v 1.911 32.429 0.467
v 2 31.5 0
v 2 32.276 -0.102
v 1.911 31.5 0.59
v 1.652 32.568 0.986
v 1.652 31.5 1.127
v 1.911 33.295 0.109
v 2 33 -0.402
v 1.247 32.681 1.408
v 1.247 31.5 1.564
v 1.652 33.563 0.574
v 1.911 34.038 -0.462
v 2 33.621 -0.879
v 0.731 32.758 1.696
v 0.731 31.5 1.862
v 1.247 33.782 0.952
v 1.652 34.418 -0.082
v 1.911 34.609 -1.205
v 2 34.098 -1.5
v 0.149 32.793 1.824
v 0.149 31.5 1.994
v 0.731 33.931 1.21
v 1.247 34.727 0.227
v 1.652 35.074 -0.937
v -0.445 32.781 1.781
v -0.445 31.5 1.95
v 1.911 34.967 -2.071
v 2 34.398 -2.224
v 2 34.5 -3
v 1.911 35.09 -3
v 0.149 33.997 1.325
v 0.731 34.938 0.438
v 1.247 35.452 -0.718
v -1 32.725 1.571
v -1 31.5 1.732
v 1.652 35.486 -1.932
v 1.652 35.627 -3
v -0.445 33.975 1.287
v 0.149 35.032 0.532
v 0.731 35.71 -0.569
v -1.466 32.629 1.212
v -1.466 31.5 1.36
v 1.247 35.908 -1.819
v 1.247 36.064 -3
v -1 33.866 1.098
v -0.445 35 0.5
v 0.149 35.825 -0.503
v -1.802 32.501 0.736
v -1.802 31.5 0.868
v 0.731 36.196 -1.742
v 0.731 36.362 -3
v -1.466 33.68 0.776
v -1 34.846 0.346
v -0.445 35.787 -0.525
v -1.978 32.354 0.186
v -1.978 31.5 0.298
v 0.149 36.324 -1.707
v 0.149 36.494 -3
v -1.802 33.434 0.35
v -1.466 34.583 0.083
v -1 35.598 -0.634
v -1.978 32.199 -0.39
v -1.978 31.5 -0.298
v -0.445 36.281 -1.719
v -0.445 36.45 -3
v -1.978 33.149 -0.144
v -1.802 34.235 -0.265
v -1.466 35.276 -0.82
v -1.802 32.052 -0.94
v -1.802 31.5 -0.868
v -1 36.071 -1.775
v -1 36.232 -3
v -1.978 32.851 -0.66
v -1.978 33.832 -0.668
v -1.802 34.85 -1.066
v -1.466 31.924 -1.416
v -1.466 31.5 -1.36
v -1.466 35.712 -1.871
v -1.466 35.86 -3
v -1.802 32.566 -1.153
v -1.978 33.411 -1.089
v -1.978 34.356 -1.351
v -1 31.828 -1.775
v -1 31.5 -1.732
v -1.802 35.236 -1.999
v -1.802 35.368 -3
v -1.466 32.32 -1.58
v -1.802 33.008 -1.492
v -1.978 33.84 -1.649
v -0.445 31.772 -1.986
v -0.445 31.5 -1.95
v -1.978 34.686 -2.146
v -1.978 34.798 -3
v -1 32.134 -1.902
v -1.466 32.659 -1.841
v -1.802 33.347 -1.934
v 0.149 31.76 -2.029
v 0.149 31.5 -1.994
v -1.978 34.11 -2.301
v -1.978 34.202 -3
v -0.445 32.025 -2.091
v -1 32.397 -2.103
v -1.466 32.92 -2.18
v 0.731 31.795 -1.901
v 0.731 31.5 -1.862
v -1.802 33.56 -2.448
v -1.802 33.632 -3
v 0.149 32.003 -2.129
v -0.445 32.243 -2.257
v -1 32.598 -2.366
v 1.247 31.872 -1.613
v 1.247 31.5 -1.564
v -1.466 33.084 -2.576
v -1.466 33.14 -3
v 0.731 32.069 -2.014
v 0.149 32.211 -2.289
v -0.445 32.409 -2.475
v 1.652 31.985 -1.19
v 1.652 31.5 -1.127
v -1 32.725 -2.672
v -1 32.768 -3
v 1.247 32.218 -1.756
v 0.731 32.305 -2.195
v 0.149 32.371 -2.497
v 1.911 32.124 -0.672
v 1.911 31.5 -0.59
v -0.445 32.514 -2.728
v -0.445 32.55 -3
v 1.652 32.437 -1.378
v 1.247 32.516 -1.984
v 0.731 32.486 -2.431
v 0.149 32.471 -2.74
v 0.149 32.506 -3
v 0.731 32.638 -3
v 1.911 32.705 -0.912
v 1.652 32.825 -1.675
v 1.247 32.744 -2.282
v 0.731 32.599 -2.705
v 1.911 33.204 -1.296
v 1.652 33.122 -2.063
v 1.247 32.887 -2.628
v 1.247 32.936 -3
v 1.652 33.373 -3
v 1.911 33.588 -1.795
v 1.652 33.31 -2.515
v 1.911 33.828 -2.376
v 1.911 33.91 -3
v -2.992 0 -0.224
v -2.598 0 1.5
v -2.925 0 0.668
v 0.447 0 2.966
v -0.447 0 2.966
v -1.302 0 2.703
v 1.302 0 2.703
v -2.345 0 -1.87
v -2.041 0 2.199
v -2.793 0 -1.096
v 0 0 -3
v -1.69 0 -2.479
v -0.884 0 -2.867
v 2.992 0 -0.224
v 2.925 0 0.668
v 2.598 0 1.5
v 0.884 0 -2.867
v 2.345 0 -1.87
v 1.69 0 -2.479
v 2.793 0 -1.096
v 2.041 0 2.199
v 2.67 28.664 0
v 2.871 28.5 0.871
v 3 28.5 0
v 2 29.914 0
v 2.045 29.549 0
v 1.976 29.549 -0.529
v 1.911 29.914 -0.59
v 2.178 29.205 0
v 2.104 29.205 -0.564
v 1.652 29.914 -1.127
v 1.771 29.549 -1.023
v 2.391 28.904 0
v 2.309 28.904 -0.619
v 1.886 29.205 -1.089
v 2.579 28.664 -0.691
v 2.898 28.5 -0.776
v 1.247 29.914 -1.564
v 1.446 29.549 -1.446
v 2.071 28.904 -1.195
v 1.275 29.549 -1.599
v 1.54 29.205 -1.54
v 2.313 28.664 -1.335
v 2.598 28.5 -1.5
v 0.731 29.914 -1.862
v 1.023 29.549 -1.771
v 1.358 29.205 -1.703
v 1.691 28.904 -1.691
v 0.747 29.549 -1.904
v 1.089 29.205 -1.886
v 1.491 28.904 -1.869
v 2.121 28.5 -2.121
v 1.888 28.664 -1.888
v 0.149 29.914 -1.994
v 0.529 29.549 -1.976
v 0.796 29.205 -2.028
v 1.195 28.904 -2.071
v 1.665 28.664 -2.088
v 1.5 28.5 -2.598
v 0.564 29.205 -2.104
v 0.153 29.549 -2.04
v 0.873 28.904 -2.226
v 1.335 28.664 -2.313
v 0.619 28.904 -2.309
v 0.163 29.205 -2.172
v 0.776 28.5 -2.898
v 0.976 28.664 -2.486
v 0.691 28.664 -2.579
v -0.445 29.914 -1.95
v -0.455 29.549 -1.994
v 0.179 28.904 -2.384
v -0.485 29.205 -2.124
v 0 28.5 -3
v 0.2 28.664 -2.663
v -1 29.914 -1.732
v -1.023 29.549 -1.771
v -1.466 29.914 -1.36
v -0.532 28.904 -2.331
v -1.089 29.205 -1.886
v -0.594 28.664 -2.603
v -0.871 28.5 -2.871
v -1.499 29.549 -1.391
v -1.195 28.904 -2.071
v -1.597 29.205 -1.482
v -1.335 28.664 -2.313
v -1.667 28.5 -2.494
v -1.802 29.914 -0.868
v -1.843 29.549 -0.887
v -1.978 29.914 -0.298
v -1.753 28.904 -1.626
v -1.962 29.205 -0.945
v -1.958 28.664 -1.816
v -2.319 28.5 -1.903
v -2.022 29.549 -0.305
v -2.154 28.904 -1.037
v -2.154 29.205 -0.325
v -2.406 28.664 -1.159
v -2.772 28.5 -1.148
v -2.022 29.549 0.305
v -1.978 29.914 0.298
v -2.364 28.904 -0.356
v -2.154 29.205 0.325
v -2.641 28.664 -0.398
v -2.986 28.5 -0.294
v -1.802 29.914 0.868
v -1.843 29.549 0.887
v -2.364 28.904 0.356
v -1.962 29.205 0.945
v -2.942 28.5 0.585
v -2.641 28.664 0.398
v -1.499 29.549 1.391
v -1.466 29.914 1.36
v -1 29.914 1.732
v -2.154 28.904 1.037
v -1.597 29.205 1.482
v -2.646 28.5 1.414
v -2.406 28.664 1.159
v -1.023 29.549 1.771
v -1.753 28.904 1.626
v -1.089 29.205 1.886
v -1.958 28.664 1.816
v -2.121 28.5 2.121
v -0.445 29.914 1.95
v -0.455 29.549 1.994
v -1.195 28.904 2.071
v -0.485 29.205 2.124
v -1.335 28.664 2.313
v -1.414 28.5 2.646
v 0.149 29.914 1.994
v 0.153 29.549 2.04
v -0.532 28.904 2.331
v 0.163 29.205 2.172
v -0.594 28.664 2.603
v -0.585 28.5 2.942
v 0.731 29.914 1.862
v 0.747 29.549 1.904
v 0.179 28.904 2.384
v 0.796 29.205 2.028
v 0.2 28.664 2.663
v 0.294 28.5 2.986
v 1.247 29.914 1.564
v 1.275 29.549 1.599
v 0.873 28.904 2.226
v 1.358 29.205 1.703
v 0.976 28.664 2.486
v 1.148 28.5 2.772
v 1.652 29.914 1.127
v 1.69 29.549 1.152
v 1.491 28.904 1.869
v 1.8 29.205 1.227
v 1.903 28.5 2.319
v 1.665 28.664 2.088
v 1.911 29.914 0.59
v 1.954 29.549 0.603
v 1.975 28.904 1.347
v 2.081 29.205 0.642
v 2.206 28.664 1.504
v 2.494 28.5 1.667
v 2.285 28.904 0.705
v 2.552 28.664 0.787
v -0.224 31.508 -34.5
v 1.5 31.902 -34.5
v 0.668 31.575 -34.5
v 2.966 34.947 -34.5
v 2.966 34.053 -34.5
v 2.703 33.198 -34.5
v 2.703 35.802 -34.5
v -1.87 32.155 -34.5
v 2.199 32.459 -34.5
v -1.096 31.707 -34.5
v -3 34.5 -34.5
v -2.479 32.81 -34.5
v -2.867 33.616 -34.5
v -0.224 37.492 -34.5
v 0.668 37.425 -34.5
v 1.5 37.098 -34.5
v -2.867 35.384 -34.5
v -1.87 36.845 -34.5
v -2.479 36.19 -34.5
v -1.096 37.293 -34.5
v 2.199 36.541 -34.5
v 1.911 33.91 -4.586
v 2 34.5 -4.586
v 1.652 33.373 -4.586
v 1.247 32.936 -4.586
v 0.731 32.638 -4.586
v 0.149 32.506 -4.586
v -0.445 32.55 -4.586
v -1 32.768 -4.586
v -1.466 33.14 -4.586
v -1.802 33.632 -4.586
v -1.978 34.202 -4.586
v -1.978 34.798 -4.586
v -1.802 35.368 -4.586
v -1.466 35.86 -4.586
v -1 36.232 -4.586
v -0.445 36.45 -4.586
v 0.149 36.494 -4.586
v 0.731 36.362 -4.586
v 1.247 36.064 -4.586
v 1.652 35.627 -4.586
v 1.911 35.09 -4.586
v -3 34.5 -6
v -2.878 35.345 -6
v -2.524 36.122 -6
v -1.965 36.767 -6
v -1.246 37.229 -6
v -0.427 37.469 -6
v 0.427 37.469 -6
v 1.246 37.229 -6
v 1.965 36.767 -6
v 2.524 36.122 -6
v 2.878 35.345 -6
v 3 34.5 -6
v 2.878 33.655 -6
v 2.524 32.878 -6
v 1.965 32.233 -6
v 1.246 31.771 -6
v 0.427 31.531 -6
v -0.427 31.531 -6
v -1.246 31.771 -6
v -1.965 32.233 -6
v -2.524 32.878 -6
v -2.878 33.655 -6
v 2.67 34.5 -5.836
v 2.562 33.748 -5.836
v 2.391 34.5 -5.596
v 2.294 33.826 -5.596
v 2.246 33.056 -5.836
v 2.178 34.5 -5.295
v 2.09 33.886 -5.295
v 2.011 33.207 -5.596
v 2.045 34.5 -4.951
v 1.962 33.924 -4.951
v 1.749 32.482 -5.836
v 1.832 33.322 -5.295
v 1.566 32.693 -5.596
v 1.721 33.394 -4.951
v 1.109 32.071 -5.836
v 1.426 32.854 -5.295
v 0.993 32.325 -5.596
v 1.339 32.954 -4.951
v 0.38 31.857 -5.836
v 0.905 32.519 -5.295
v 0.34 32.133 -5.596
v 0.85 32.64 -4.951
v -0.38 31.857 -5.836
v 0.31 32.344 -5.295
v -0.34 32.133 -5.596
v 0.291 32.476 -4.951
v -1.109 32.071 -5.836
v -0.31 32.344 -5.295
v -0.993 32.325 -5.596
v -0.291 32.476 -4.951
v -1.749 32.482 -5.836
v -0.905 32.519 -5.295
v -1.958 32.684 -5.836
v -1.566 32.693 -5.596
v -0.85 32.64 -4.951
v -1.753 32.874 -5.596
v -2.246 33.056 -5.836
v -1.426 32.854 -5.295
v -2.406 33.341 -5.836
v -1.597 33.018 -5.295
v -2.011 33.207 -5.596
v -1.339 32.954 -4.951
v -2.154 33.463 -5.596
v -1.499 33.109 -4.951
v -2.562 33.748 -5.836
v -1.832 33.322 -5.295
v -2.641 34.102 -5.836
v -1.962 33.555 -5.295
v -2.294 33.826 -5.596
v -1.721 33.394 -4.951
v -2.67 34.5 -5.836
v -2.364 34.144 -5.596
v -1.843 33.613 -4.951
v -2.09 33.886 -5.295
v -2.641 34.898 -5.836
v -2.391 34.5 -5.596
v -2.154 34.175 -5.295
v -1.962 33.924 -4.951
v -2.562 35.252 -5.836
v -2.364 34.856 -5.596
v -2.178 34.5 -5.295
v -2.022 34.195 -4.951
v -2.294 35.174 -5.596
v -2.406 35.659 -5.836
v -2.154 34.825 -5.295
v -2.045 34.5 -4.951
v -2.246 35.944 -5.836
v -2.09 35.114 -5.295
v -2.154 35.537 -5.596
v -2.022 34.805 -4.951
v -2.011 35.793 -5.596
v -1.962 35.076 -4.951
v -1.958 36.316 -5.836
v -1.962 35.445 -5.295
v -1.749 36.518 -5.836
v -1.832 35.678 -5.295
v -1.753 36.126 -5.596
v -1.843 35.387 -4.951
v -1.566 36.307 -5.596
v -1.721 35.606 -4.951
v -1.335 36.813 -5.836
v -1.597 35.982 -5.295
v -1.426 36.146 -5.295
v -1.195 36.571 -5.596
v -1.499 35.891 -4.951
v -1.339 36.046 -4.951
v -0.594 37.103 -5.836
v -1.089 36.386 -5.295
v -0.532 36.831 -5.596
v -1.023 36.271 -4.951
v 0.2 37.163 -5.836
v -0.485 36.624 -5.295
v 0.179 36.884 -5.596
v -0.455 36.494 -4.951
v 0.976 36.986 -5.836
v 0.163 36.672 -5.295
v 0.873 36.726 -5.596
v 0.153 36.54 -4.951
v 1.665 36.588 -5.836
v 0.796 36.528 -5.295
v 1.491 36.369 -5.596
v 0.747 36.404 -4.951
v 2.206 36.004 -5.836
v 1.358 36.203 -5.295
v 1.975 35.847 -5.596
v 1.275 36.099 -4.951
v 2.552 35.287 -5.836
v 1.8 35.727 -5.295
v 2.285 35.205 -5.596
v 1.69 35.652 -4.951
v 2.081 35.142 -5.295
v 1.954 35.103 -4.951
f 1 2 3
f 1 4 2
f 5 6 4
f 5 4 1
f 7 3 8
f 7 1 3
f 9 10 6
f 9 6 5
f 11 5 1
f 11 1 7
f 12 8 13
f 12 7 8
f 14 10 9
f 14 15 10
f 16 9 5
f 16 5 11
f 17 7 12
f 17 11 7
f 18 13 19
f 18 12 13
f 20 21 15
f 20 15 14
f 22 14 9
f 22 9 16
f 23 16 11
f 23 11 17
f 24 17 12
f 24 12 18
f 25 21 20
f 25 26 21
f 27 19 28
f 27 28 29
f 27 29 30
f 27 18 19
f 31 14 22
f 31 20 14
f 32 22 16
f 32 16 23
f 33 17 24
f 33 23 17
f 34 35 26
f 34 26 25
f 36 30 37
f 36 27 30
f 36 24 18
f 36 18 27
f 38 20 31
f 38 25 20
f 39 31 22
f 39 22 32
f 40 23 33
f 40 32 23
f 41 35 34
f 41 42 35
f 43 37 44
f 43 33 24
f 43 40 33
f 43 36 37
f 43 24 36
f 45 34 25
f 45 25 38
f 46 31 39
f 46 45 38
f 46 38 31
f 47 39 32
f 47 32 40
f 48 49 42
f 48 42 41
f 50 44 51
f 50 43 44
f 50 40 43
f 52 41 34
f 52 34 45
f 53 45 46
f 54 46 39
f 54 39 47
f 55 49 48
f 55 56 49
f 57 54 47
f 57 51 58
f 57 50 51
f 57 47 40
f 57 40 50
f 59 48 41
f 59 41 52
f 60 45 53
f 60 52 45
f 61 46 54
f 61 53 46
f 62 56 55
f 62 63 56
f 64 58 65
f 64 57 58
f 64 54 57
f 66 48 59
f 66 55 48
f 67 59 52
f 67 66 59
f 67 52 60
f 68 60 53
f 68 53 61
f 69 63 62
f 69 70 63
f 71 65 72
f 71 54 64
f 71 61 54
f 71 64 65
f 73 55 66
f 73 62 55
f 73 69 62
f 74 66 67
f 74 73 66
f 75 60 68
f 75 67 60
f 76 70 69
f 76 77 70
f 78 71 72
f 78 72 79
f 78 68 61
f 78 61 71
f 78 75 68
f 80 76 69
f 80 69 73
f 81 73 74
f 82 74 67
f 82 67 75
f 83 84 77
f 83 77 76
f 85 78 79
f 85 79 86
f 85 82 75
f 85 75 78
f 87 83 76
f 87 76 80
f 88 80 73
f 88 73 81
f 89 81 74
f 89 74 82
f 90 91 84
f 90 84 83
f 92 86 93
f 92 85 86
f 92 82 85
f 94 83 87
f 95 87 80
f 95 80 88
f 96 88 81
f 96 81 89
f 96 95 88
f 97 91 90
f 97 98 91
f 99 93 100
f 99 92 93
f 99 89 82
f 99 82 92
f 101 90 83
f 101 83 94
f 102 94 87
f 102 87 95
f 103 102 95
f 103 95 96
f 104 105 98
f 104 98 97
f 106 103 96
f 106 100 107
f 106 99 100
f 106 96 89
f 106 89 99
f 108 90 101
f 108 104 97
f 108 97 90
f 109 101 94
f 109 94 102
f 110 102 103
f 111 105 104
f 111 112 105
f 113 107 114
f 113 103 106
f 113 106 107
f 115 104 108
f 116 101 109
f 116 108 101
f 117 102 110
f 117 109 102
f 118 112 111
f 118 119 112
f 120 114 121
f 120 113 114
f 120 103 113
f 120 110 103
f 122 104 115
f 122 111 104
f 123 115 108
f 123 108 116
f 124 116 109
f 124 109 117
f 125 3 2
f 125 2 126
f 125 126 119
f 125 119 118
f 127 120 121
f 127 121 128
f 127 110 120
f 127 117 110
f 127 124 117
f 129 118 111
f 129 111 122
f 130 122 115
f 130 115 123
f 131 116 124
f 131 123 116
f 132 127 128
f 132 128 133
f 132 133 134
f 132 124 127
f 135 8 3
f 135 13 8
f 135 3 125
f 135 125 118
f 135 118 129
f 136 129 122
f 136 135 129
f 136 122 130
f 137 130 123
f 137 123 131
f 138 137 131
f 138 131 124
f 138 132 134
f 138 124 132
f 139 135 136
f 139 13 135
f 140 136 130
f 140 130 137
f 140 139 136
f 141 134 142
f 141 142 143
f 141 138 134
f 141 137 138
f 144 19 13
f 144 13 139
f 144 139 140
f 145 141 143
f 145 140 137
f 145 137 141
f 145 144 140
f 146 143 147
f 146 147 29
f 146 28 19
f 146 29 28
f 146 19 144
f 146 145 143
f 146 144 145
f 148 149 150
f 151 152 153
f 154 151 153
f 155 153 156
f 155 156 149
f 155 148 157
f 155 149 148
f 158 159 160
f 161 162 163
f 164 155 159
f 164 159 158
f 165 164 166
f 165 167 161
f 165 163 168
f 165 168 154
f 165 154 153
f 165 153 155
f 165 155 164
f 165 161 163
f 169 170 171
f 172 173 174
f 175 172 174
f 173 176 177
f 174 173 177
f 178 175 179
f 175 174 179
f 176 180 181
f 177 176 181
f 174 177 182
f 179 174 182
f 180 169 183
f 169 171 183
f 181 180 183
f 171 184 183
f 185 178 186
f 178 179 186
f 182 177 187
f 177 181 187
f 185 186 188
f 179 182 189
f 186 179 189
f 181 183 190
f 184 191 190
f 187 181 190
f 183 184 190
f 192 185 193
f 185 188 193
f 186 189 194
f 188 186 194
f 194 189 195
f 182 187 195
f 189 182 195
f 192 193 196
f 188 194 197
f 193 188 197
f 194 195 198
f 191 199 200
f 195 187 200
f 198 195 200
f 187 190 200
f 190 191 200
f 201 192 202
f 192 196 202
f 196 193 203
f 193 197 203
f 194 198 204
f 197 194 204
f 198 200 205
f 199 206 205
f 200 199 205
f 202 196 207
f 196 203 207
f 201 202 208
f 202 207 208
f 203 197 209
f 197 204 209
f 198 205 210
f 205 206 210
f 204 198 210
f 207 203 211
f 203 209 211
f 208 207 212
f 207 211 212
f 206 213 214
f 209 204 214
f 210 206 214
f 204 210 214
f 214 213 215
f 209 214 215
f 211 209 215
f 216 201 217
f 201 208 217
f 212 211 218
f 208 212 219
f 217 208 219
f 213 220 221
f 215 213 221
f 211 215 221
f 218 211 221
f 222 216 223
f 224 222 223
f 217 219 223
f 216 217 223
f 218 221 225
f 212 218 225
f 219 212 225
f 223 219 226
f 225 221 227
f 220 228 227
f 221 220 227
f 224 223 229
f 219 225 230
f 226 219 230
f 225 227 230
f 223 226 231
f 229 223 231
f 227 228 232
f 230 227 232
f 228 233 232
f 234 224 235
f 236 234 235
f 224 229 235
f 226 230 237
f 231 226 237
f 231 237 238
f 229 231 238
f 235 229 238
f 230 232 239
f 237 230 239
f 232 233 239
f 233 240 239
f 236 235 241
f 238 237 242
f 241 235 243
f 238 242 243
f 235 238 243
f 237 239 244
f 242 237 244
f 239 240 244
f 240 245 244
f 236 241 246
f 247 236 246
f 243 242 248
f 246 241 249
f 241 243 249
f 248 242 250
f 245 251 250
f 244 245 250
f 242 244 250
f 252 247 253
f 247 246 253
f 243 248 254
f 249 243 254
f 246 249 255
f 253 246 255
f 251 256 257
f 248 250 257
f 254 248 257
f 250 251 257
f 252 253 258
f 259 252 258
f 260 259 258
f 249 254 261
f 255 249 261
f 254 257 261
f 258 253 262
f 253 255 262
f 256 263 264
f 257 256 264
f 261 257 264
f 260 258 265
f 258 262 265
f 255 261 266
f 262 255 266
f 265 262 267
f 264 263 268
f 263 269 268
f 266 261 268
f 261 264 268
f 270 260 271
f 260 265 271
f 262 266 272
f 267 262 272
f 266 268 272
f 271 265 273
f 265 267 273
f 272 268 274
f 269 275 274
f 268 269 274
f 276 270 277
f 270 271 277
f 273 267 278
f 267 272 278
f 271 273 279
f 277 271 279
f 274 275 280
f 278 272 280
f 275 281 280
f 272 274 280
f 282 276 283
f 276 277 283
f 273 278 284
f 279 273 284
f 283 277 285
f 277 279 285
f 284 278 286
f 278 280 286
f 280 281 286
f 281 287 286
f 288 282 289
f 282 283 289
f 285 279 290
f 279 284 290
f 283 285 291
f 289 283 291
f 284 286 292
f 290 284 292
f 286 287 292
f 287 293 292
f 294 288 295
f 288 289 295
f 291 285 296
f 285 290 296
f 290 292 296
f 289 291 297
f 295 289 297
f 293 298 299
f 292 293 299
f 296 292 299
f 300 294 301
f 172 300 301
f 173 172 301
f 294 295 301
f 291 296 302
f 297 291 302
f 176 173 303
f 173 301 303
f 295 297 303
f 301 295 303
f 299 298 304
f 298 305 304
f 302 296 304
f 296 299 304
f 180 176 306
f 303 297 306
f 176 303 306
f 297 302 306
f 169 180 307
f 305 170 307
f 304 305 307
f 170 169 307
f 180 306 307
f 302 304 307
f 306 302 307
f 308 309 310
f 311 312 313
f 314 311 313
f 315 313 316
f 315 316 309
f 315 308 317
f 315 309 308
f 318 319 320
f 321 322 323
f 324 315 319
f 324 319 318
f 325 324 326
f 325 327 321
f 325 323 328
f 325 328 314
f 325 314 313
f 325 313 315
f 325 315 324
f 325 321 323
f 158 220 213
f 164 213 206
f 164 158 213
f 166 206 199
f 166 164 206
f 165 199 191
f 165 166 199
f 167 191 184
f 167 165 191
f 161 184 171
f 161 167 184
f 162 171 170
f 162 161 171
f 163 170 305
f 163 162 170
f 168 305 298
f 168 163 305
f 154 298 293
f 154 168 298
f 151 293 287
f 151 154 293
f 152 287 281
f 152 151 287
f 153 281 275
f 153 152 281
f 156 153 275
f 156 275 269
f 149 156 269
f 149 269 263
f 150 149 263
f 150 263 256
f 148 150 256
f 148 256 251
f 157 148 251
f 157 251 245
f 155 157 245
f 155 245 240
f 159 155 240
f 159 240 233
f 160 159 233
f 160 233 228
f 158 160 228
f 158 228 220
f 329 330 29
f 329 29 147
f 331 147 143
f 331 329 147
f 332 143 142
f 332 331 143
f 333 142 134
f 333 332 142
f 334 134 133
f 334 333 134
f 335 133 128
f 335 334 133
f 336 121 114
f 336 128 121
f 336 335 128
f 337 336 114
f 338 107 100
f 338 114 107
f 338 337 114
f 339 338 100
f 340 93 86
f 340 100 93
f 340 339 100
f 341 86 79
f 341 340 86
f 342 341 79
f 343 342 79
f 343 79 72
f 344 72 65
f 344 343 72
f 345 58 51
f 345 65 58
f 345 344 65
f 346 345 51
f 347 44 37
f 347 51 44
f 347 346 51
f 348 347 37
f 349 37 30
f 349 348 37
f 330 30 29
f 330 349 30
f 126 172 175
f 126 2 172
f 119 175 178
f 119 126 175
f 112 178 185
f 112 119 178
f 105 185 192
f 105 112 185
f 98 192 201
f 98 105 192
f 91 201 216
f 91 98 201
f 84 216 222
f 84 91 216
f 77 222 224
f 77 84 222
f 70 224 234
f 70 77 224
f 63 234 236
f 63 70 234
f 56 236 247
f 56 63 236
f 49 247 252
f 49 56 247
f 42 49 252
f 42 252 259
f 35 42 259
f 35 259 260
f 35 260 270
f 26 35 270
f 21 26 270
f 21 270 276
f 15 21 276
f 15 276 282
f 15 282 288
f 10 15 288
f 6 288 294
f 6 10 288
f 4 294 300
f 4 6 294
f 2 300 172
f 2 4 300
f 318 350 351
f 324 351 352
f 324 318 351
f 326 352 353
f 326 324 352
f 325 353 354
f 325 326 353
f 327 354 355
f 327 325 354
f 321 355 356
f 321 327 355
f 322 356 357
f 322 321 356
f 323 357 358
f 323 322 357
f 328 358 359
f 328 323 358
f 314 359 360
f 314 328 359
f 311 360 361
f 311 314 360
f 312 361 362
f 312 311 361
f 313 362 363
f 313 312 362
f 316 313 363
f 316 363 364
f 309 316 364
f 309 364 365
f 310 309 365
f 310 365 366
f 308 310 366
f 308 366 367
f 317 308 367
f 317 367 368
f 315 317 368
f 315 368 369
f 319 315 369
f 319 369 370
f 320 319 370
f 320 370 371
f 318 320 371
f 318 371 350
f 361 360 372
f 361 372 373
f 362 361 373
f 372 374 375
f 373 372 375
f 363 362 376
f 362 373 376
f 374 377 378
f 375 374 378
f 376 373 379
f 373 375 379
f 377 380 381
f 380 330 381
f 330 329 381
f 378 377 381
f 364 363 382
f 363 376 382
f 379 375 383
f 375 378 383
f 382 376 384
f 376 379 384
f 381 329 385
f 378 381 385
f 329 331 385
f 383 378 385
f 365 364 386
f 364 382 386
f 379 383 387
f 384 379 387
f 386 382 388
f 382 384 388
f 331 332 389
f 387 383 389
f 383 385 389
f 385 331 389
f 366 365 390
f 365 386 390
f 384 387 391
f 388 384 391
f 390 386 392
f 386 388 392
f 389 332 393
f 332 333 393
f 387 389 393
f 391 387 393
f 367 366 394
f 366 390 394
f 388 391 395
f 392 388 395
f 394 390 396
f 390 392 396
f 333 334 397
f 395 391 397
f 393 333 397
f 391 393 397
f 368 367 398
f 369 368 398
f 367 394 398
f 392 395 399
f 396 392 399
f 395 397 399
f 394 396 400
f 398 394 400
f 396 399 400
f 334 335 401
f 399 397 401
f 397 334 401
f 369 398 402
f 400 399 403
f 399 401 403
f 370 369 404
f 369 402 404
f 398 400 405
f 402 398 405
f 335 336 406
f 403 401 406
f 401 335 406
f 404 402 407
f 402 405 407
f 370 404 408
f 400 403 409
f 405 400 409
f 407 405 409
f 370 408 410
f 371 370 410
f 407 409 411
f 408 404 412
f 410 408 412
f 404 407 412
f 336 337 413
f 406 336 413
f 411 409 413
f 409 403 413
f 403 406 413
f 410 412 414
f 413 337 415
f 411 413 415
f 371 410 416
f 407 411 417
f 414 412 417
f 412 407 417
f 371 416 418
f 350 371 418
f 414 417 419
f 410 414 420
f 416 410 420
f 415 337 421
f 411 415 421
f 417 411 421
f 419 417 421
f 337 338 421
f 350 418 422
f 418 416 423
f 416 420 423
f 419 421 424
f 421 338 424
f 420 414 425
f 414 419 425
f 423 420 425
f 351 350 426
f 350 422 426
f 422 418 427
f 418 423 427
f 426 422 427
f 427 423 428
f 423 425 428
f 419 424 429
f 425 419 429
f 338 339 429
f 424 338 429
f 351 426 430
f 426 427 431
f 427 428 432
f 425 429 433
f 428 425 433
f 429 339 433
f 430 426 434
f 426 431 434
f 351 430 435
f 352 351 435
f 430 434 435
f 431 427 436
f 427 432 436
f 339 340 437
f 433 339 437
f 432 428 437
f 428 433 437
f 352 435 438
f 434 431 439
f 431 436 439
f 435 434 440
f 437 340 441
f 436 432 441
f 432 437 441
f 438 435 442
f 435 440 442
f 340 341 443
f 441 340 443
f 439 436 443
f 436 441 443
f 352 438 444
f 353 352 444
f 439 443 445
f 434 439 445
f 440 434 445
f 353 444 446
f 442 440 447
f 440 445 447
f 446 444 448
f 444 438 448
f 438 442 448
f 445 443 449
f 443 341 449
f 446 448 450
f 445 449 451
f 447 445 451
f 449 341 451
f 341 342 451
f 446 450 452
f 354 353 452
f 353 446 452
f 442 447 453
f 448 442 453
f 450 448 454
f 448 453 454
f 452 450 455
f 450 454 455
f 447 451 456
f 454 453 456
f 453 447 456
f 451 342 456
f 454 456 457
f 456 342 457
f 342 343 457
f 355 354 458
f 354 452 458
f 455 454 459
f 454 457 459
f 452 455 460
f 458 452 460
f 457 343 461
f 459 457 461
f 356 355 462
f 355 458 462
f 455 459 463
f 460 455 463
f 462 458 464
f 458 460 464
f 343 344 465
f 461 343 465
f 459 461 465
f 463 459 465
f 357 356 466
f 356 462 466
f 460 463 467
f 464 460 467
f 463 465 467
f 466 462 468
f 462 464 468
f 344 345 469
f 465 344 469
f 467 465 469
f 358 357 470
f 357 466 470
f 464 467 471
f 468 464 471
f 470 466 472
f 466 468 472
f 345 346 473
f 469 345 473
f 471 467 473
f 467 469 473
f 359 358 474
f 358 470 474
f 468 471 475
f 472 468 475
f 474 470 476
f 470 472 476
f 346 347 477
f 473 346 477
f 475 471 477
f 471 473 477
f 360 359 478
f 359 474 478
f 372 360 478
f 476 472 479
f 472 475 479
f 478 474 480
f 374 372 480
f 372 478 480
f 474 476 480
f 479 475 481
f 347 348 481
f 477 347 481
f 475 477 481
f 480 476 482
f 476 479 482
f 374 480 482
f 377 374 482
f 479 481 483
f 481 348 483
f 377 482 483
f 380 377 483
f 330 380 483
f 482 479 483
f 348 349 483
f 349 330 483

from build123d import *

# Parameters (mm, degrees)
SKETCH_1_R      = 2
SKETCH_3_R      = 3
EXTRUDE_1_DEPTH = 28.5
SKETCH_4_R      = 3
EXTRUDE_2_DEPTH = 28.5
FILLET_1_R      = 1.5


with BuildPart() as part:
    # 스윕1: sweep along a path in 스케치2
    with BuildLine(Plane(origin=(0, 0, 0), x_dir=(0, 0, -1), z_dir=(1, 0, 0))) as sweep_1_path:
        Line((0, 0), (0, 31.5))
        ThreePointArc((0, 31.5), (0.878679656, 33.621320344), (3, 34.5))
        Line((3, 34.5), (34.5, 34.5))
    # 스케치1 → 스윕1 (sweep)
    with BuildSketch(Plane(origin=(0, 0, 0), x_dir=(1, 0, 0), z_dir=(0, 1, 0))):
        Circle(SKETCH_1_R)
    sweep(path=sweep_1_path.line)

    # 스케치3 → 보스-돌출1 (add)
    with BuildSketch(Plane.XZ):
        with Locations(Location((0, 0, 0), (0, 0, 270))):
            Circle(SKETCH_3_R)
    extrude(amount=-EXTRUDE_1_DEPTH)

    # 스케치4 → 보스-돌출2 (add)
    with BuildSketch(Plane(origin=(0, 0, -34.5), x_dir=(-1, 0, 0), z_dir=(0, 0, -1))):
        with Locations((0, 34.5)):
            Circle(SKETCH_4_R)
    extrude(amount=-EXTRUDE_2_DEPTH)

    # 필렛1
    # the kernel refuses this fillet: 1.5 mm, written as the material it adds along each edge
    with BuildSketch(Plane(origin=(0, 28.5, 0), x_dir=(1, 0, 0), z_dir=(0, 0, 1))) as fillet_1_piece_1:
        with BuildLine():
            CenterArc((3.5, 1.414213562), FILLET_1_R, 180, 70.528779366)
            Line((2, 1.414213562), (1.97, 1.414213562))
            Line((1.97, 1.414213562), (1.97, 0))
            Line((1.97, 0), (2, -0.03))
            ThreePointArc((2, -0.03), (2.5, -0.03), (2.99, -0.028284271))
            Line((2.99, -0.028284271), (3, 0))
        make_face()
    revolve(axis=Axis((0, 28.5, 0), (0, 1, 0)))
    with BuildSketch(Plane(origin=(0, 34.5, -6), x_dir=(1, 0, 0), z_dir=(0, 1, 0))) as fillet_1_piece_2:
        with BuildLine():
            CenterArc((3.5, -1.414213562), FILLET_1_R, 109.471220634, 70.528779366)
            Line((3, 0), (2.99, 0.028284271))
            ThreePointArc((2.99, 0.028284271), (2.5, 0.03), (2, 0.03))
            Line((2, 0.03), (1.97, 0))
            Line((1.97, 0), (1.97, -1.414213562))
            Line((1.97, -1.414213562), (2, -1.414213562))
        make_face()
    revolve(axis=Axis((0, 34.5, -6), (0, 0, -1)))


solid = part.part
